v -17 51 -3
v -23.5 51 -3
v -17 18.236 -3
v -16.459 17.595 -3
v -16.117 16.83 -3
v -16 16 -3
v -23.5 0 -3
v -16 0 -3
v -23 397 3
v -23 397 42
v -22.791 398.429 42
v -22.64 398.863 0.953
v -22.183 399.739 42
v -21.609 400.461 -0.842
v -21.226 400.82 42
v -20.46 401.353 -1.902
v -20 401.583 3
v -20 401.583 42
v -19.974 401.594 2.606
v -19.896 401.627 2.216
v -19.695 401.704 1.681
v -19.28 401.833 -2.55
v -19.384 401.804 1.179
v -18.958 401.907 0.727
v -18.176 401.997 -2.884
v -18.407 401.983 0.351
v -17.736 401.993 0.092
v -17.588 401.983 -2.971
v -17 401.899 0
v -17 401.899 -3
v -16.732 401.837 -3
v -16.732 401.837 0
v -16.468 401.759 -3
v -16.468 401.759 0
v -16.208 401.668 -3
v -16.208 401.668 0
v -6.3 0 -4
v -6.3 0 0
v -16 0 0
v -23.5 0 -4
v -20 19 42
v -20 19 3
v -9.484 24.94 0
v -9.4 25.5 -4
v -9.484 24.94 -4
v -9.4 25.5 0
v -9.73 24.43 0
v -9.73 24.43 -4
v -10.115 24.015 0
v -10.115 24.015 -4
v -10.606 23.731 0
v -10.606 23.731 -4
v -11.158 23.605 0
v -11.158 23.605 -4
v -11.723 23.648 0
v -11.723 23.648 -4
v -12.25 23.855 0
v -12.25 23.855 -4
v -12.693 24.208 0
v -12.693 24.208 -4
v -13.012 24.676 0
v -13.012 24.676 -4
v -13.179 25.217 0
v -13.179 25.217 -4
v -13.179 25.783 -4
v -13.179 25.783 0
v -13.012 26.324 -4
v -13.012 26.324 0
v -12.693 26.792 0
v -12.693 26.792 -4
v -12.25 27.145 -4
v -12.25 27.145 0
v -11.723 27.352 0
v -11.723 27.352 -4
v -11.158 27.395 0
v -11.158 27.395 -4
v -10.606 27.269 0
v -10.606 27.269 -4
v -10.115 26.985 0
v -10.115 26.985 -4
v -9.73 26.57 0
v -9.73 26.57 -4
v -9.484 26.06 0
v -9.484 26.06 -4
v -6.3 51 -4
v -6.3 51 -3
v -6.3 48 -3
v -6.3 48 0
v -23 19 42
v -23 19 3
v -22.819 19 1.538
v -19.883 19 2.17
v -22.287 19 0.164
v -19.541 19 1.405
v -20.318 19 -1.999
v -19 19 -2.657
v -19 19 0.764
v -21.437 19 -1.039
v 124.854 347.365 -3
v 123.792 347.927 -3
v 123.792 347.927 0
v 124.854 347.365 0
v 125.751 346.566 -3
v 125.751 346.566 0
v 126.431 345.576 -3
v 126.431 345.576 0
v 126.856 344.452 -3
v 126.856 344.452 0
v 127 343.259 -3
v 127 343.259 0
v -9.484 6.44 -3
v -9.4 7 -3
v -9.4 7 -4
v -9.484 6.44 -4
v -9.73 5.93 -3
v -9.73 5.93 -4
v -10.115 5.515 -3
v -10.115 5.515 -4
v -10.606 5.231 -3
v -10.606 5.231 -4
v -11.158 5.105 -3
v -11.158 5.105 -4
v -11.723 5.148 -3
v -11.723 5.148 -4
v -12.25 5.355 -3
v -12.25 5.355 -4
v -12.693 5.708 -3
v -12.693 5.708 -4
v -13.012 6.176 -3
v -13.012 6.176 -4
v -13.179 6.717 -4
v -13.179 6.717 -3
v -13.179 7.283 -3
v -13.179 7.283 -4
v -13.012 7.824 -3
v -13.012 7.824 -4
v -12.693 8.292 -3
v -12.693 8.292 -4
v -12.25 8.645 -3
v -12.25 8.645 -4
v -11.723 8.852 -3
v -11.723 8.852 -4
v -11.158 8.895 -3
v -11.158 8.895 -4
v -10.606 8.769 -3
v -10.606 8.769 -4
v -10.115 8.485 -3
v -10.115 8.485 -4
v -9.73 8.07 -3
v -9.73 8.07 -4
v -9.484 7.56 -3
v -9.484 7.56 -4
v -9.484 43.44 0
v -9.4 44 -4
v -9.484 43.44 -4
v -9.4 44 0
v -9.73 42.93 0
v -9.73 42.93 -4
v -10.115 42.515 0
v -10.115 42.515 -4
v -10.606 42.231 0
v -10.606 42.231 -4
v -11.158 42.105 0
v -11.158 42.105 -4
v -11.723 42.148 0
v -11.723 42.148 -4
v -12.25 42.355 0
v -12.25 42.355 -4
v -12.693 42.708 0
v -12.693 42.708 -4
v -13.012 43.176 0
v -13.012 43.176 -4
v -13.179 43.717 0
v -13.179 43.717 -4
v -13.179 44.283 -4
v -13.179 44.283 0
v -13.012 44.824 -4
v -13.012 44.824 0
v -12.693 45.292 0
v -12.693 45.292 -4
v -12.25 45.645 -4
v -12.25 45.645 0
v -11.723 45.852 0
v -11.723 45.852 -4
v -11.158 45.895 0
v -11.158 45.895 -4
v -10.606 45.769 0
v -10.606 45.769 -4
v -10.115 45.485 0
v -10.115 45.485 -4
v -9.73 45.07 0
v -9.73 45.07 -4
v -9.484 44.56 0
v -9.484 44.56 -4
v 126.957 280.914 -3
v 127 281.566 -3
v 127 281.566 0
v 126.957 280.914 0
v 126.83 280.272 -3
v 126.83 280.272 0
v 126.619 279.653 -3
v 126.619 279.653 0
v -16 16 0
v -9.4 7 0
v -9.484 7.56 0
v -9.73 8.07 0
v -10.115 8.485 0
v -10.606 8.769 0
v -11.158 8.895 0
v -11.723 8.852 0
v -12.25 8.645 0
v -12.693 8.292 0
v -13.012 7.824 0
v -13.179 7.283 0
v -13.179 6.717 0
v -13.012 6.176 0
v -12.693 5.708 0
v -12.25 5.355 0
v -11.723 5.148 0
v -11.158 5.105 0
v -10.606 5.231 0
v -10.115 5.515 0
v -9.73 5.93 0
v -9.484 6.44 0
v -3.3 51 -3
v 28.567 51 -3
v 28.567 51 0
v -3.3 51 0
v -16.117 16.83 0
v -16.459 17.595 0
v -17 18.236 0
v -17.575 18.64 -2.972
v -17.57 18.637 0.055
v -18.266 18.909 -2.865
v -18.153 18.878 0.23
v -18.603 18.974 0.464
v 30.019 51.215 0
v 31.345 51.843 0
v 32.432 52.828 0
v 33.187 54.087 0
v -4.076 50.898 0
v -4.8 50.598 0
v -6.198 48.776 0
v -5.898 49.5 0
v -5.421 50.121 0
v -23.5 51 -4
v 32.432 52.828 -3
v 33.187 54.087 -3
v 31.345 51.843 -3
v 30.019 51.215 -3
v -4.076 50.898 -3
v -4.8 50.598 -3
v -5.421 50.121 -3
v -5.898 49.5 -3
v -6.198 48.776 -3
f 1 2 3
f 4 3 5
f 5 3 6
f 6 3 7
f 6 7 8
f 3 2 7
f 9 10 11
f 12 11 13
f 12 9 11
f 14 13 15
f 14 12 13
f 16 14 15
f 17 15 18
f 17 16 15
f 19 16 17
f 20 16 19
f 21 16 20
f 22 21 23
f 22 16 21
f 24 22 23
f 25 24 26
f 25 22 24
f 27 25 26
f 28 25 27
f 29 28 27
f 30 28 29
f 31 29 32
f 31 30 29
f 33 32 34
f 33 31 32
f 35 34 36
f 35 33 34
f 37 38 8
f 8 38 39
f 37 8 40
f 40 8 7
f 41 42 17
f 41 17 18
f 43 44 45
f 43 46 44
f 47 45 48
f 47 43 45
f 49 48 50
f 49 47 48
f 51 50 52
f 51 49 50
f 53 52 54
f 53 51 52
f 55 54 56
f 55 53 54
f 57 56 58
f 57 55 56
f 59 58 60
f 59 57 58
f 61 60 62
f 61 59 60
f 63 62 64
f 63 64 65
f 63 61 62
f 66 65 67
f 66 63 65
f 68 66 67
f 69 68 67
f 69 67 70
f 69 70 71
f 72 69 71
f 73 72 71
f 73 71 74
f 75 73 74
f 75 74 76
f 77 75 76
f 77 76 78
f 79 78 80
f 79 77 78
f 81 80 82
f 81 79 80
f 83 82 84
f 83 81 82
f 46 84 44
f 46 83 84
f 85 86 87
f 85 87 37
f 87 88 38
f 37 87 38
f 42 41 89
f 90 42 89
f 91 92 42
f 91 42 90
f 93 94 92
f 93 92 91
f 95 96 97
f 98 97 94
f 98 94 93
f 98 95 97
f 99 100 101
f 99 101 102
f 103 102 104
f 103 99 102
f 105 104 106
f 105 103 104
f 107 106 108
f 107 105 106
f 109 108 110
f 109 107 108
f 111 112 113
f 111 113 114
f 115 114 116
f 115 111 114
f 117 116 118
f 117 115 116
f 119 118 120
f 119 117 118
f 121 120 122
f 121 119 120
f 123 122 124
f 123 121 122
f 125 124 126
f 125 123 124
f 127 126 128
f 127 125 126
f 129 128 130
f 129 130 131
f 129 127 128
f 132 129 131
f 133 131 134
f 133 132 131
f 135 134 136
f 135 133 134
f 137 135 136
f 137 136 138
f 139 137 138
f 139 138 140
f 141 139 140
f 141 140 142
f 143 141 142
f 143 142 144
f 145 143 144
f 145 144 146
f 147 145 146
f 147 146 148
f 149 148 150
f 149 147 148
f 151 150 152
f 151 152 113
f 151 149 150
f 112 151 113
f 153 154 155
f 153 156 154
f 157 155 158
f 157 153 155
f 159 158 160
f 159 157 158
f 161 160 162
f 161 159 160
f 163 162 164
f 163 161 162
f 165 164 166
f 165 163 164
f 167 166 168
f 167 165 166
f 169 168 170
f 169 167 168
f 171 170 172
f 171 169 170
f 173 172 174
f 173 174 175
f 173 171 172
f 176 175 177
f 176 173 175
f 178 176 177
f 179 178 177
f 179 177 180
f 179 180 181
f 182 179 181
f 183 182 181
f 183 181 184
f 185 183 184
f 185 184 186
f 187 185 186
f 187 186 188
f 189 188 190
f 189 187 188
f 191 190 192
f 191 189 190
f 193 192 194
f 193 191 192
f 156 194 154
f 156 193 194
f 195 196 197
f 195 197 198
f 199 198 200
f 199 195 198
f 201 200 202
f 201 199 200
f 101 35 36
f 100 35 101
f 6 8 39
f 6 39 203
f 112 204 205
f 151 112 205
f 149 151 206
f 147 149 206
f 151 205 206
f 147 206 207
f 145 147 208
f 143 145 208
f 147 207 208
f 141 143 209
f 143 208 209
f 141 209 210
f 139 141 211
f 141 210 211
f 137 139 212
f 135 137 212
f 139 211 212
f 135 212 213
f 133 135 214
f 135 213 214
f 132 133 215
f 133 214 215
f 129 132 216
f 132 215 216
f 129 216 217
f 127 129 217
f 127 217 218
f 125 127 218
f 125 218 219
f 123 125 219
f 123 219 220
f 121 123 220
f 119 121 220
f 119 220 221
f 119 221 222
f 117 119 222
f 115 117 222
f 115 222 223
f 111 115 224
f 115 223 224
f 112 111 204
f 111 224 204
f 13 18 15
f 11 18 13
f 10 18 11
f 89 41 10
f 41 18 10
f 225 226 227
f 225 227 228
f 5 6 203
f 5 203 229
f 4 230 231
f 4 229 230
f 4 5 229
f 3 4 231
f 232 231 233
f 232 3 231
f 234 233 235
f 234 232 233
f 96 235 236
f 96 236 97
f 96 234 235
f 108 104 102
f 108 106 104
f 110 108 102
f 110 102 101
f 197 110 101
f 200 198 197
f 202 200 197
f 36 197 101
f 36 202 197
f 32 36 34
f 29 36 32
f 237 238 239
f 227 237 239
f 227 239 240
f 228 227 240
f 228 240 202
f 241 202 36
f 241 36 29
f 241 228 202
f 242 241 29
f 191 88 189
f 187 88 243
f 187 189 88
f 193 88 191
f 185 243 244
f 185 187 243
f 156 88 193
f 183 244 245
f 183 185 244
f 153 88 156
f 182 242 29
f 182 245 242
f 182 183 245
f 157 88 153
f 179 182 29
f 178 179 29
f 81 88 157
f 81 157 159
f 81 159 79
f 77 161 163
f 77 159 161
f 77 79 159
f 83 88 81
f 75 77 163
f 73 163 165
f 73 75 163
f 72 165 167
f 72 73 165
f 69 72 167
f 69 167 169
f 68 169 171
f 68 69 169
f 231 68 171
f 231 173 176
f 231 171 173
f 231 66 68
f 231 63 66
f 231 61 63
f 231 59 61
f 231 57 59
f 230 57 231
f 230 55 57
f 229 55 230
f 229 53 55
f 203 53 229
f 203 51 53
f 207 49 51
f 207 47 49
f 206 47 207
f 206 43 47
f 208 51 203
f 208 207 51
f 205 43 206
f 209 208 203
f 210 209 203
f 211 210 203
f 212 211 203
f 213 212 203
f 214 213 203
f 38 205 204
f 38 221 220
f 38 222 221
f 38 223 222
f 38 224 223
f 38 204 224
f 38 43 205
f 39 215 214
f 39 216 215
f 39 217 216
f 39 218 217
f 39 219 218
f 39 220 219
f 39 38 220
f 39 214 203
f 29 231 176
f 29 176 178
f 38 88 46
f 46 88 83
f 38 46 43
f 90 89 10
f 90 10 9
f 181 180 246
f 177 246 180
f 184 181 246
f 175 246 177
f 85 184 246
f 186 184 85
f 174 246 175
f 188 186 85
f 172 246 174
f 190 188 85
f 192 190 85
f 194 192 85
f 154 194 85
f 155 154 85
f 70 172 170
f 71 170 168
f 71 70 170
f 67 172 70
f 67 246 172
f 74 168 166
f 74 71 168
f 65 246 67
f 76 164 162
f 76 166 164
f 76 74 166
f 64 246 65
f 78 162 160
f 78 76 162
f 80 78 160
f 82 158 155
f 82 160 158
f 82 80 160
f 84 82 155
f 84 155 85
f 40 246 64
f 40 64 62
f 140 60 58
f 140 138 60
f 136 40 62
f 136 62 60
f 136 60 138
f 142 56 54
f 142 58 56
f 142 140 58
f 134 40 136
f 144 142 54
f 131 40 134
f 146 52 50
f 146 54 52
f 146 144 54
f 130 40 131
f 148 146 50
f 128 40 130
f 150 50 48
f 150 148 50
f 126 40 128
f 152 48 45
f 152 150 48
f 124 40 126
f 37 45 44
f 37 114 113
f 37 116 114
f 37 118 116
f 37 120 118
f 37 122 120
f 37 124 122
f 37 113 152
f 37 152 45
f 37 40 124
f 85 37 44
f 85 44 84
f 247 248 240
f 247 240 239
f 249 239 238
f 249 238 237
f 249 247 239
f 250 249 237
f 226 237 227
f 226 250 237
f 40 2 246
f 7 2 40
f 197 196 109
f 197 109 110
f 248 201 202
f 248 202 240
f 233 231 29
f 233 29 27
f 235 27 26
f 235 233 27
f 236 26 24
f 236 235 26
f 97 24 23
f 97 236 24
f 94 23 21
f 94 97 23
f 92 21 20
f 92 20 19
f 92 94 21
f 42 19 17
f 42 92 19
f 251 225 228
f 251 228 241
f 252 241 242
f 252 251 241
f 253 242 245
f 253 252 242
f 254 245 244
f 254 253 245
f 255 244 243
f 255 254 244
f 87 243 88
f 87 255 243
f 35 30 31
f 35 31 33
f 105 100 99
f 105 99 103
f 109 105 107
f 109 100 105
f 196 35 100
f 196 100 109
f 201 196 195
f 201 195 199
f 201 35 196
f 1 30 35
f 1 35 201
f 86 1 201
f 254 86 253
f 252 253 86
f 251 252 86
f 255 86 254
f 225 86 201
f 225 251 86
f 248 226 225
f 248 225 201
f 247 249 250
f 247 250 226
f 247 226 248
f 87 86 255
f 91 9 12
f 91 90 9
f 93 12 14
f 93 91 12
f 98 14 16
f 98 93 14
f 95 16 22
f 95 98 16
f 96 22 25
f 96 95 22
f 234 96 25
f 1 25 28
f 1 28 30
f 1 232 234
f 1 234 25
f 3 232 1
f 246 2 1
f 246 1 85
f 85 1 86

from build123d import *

# Parameters (mm, degrees)
F1_DEPTH = 500
F2_W     = 221.745663
F2_H     = 538.323703
F2_R     = 1.9
F3_DEPTH = 50
F4_W     = 4.4
F4_H     = 51
F4_W_2   = 12.8
F4_R     = 1.9
F5_DEPTH = 1


with BuildPart() as f1:
    # F0 (on Front) → F1 (new body)
    with BuildSketch(Plane.XZ):
        with BuildLine():
            Line((-20, 3), (-20, 42))
            Line((-20, 42), (-23, 42))
            Line((-23, 42), (-23, 3))
            ThreePointArc((-23, 3), (-21.242641, -1.242641), (-17, -3))
            Line((-17, -3), (127, -3))
            Line((127, -3), (127, 0))
            Line((127, 0), (-17, 0))
            ThreePointArc((-17, 0), (-19.12132, 0.87868), (-20, 3))
        make_face()
    extrude(amount=-F1_DEPTH)

    # F2 (on Top) → F3 (cut, symmetric)
    with BuildSketch(Plane.XY):
        with Locations((54.499505, 256.060087)):
            Rectangle(F2_W, F2_H)
        with BuildLine():
            Line((126.619398, 279.652744), (33.186834, 54.086583))
            ThreePointArc((33.186834, 54.086583), (31.345288, 51.842652), (28.567437, 51))
            Line((28.567437, 51), (-3.3, 51))
            ThreePointArc((-3.3, 51), (-5.421321, 50.12132), (-6.3, 48))
            Line((-6.3, 48), (-6.3, 0))
            Line((-6.3, 0), (-16, 0))
            Line((-16, 0), (-16, 16))
            ThreePointArc((-16, 16), (-16.87868, 18.12132), (-19, 19))
            Line((-19, 19), (-23, 19))
            Line((-23, 19), (-23, 397))
            ThreePointArc((-23, 397), (-20.832031, 401.120631), (-16.20816, 401.667902))
            Line((-16.20816, 401.667902), (123.79184, 347.926937))
            ThreePointArc((123.79184, 347.926937), (126.120631, 346.091066), (127, 343.259035))
            Line((127, 343.259035), (127, 281.566161))
            ThreePointArc((127, 281.566161), (126.903926, 280.59071), (126.619398, 279.652744))
        make_face(mode=Mode.SUBTRACT)
        Polygon((467.411696, 344.689719), (455.614504, 344.432303), (456.010659, 326.276753), (456.727063, 293.44444), (469.524017, 293.72367), (468.411458, 344.711534), align=None)
        with Locations((461.573169, 300.551848)):
            Circle(F2_R, mode=Mode.SUBTRACT)
        with Locations((461.169593, 319.047446)):
            Circle(F2_R, mode=Mode.SUBTRACT)
        with Locations((460.766018, 337.543043)):
            Circle(F2_R, mode=Mode.SUBTRACT)
        Polygon((472.810411, 344.807519), (468.411458, 344.711534), (469.524017, 293.72367), (473.92297, 293.819656), align=None)
        Polygon((485.607364, 345.08675), (472.810411, 344.807519), (473.92297, 293.819656), (474.922732, 293.841471), (486.719924, 294.098886), align=None)
        with Locations((481.568409, 300.988146)):
            Circle(F2_R, mode=Mode.SUBTRACT)
        with Locations((481.164834, 319.483744)):
            Circle(F2_R, mode=Mode.SUBTRACT)
        with Locations((480.761259, 337.979341)):
            Circle(F2_R, mode=Mode.SUBTRACT)
        with Locations((-11.3, 44)):
            Circle(F2_R)
        with Locations((-11.3, 25.5)):
            Circle(F2_R)
        with Locations((-11.3, 7)):
            Circle(F2_R)
    extrude(amount=F3_DEPTH, both=True, mode=Mode.SUBTRACT)

    # F4 (on face) → F5 (join)
    with BuildSketch(Plane(origin=(0, 0, -3), x_dir=(1, 0, 0), z_dir=(0, 0, -1))):
        with Locations((-21.3, -25.5)):
            Rectangle(F4_W, F4_H)
        with Locations((-12.7, -25.5)):
            Rectangle(F4_W_2, F4_H)
        with Locations((-11.3, -44)):
            Circle(F4_R, mode=Mode.SUBTRACT)
        with Locations((-11.3, -25.5)):
            Circle(F4_R, mode=Mode.SUBTRACT)
        with Locations((-11.3, -7)):
            Circle(F4_R, mode=Mode.SUBTRACT)
    extrude(amount=F5_DEPTH)


solid = f1.part
